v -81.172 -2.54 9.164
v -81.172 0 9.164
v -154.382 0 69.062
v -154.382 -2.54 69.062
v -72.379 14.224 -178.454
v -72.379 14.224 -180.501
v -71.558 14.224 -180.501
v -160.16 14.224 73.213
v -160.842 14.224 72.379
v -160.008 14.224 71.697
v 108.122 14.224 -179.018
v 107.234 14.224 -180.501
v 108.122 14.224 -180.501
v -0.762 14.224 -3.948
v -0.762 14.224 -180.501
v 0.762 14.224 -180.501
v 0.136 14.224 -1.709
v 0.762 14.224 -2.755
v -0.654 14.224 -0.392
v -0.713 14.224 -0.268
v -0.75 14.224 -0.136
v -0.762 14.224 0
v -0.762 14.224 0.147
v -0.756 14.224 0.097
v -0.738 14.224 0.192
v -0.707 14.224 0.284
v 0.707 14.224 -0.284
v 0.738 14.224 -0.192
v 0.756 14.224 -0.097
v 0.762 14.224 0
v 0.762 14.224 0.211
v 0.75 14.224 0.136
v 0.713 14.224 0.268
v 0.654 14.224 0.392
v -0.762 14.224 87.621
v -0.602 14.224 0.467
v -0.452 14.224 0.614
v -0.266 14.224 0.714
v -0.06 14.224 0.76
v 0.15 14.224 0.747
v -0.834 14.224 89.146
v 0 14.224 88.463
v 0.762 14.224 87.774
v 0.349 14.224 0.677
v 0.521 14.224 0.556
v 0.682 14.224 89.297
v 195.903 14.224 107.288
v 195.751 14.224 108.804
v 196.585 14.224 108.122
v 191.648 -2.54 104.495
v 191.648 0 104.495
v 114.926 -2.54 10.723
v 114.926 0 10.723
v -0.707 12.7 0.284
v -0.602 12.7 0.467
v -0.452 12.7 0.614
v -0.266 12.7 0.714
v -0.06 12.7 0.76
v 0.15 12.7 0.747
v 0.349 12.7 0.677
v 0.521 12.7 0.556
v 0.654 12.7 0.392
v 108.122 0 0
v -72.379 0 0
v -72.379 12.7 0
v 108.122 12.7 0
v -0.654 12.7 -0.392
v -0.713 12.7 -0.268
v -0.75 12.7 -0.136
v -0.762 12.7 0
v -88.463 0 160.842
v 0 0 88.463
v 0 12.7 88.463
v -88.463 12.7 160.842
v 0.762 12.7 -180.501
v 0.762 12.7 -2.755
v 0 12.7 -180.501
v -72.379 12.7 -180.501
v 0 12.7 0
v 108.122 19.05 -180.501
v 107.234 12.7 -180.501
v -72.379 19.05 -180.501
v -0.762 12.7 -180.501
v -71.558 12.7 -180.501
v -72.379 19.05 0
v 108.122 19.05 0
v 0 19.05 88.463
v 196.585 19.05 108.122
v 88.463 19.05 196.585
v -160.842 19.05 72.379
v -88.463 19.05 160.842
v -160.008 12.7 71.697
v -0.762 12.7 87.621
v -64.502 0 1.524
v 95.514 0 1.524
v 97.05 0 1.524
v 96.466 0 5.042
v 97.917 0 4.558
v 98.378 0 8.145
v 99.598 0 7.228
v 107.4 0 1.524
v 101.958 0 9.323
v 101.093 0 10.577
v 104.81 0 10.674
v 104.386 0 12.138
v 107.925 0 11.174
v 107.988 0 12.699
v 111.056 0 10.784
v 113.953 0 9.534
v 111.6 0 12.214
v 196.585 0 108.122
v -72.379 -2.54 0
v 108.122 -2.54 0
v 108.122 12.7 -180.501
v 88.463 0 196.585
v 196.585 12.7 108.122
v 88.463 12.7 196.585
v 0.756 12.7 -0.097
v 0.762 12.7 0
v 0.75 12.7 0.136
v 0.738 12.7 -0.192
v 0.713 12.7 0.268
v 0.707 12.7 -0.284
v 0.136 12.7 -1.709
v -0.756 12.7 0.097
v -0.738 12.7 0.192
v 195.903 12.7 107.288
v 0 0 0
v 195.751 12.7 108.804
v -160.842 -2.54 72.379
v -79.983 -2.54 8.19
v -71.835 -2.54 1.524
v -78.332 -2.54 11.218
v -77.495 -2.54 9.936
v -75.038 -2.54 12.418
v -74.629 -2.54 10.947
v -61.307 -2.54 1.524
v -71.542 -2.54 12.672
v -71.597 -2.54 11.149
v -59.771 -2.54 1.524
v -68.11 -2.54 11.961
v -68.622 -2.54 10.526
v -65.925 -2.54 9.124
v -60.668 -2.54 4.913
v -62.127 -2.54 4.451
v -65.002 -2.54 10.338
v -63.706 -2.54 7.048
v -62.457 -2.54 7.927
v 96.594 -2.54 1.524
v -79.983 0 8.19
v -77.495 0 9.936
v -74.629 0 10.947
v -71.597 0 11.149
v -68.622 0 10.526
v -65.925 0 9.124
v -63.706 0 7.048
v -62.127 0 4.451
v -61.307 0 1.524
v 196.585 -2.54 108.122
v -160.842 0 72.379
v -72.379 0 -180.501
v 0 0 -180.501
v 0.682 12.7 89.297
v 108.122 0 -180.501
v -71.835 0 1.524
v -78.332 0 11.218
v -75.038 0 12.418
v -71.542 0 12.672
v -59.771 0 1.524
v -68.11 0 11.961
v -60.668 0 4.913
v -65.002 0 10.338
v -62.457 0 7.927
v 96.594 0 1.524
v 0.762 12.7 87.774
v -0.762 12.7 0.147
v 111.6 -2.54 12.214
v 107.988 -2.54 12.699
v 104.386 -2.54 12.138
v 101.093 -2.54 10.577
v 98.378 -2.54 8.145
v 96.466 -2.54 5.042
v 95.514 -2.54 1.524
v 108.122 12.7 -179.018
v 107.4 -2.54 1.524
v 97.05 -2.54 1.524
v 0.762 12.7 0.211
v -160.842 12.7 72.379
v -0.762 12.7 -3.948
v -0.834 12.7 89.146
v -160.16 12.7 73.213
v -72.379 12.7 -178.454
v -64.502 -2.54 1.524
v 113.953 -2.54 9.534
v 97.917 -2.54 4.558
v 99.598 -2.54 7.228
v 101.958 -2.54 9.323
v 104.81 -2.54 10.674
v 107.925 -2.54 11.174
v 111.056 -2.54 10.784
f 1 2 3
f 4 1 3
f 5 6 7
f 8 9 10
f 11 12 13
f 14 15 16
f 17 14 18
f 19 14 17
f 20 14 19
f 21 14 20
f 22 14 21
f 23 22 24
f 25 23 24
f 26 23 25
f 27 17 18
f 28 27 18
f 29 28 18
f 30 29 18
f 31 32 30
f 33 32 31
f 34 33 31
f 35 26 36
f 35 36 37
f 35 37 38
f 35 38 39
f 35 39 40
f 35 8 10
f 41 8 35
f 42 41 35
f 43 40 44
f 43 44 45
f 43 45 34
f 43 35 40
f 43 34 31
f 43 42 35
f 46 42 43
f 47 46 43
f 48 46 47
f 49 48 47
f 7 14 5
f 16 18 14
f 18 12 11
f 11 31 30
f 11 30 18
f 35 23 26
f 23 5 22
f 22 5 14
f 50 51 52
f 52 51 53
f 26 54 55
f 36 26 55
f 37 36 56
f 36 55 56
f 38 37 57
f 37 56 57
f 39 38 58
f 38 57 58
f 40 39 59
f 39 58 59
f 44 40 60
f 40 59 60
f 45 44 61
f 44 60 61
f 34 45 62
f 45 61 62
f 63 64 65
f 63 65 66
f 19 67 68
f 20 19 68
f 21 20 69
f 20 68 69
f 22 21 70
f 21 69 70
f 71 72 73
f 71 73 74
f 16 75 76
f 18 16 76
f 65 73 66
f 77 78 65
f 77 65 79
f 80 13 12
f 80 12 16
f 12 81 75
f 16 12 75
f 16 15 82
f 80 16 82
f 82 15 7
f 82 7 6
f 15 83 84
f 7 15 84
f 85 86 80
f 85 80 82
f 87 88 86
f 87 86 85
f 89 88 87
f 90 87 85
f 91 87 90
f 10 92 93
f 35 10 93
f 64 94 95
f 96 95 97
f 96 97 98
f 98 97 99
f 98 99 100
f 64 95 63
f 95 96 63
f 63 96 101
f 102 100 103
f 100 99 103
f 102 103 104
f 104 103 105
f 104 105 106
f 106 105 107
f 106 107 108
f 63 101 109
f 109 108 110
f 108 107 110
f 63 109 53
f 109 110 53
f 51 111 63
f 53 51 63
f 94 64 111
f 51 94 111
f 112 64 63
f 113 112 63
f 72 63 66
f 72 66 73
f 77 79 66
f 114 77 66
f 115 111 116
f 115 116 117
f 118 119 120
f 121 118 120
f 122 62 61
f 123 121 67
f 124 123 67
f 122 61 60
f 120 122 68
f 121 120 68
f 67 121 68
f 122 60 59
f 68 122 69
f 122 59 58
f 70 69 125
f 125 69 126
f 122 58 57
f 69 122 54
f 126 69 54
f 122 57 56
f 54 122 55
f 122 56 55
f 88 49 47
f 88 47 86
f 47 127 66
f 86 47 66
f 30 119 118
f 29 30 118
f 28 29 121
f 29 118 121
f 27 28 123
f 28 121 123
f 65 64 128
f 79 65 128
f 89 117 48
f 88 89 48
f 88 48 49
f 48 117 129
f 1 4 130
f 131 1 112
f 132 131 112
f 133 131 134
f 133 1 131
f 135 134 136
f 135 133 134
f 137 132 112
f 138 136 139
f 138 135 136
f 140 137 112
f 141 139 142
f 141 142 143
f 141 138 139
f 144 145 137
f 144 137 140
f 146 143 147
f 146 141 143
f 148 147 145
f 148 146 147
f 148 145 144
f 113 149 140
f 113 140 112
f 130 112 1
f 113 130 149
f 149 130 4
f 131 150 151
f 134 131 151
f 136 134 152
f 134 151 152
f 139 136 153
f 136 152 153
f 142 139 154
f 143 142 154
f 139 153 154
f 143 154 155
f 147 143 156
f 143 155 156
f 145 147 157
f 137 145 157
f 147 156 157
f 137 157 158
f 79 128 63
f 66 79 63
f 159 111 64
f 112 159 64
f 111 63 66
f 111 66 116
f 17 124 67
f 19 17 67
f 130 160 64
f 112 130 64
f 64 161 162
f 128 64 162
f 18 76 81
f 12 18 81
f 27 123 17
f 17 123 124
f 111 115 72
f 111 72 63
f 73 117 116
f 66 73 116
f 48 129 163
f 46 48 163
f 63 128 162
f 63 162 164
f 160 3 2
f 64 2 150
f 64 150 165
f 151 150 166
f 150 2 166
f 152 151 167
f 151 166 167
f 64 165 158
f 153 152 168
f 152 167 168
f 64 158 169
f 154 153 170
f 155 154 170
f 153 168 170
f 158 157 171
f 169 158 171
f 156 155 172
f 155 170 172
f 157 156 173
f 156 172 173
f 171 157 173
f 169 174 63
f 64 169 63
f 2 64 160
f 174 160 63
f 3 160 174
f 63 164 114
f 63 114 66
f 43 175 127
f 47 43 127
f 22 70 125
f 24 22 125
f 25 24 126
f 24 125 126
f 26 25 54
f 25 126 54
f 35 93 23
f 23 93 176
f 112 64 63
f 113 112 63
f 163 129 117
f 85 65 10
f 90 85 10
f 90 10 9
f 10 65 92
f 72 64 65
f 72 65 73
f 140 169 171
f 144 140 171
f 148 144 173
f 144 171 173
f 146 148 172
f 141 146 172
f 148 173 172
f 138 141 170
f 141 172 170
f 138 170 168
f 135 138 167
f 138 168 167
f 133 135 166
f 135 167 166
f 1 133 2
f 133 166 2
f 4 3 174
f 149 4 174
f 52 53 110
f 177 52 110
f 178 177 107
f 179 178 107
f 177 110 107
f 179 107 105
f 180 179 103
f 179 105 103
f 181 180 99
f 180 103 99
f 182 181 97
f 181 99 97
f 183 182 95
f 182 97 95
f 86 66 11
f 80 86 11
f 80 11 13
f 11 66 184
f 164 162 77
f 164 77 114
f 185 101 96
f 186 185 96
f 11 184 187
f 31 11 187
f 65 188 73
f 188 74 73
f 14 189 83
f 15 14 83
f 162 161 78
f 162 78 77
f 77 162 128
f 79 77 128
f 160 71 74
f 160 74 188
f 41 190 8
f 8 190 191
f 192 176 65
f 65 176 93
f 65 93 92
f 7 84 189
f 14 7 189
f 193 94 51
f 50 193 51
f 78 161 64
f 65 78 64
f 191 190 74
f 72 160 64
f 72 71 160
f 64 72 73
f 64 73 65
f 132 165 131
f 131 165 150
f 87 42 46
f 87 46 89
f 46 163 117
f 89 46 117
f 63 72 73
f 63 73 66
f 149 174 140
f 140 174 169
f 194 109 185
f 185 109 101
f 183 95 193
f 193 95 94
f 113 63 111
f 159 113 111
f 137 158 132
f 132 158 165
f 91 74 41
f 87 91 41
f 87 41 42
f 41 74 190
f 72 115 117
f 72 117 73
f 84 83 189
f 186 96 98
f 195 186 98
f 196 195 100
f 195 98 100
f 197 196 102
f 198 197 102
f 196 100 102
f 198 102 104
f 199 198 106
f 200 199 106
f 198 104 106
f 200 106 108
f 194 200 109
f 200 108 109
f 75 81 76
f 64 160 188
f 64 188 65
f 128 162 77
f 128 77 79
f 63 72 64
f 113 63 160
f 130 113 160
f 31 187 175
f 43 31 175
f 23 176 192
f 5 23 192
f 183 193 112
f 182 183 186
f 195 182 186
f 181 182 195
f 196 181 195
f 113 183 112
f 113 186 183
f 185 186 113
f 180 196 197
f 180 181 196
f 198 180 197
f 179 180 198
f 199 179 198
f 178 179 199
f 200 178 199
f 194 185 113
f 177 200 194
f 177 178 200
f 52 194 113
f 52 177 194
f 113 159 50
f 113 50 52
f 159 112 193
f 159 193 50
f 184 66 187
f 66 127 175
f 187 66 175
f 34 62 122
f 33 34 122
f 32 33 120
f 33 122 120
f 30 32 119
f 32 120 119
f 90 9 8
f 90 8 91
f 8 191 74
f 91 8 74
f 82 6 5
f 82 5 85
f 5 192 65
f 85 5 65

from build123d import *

# Parameters (mm, degrees)
F1_DEPTH  = 12.7
F3_DEPTH  = 6.35
F4_DEPTH  = 12.7
F0_W      = 72.3790794264
F0_H      = 180.5009141251
F5_DEPTH  = 12.7
F6_DEPTH  = 12.7
F0_W_2    = 108.1218346987
F7_DEPTH  = 12.7
F9_DEPTH  = 2.54
F11_DEPTH = 2.54
F13_DEPTH = 1.524


with BuildPart() as f1:
    # F0 (on Front) → F1 (new body)
    with BuildSketch(Plane.XZ):
        Polygon((0, 88.4633192989), (-72.3790794264, 0), (0, 0), (108.1218346987, 0), align=None)
    extrude(amount=-F1_DEPTH)


with BuildPart() as f3:
    # F2 (on face) → F3 (new body)
    with BuildSketch(Plane(origin=(0, 12.7, 0), x_dir=(-1, 0, 0), z_dir=(0, 1, 0))):
        Polygon((-196.5851539976, 108.1218346987), (-108.1218346987, 0), (-108.1218346987, -180.5009141251), (72.3790794264, -180.5009141251), (72.3790794264, 0), (160.8423987253, 72.3790794264), (88.4633192989, 160.8423987253), (0, 88.4633192989), (-88.4633192989, 196.5851539976), align=None)
    extrude(amount=F3_DEPTH)

    # F12 (on face) → F13 (cut)
    with BuildSketch(Plane.XZ.offset(-12.7)):
        with BuildLine():
            Line((196.5093321637, 108.8800530376), (-0.0758218339, 89.2215376379))
            ThreePointArc((-0.0758218339, 89.2215376379), (0.5113060544, 89.0283061295), (0.762, 88.4633192989))
            Line((0.762, 88.4633192989), (0.762, 87.7737187766))
            Line((0.762, 87.7737187766), (196.6609758315, 107.3636163598))
            ThreePointArc((196.6609758315, 107.3636163598), (197.3433723366, 108.1976565326), (196.5093321637, 108.8800530376))
        make_face()
        with BuildLine():
            ThreePointArc((-0.762, 88.4633192989), (-0.5649868306, 88.9746253534), (-0.0758218339, 89.2215376379))
            Line((-0.0758218339, 89.2215376379), (-160.9182205592, 73.1372977653))
            ThreePointArc((-160.9182205592, 73.1372977653), (-161.6006170643, 72.3032575925), (-160.7665768915, 71.6208610875))
            Line((-160.7665768915, 71.6208610875), (-0.762, 87.6213187766))
            Line((-0.762, 87.6213187766), (-0.762, 88.4633192989))
        make_face()
        with BuildLine():
            ThreePointArc((0.762, 88.4633192989), (0.5113060544, 89.0283061295), (-0.0758218339, 89.2215376379))
            ThreePointArc((-0.0758218339, 89.2215376379), (-0.5649868306, 88.9746253534), (-0.762, 88.4633192989))
            ThreePointArc((-0.762, 88.4633192989), (-0.5113060544, 87.8983324684), (0.0758218339, 87.70510096))
            ThreePointArc((0.0758218339, 87.70510096), (0.5649868306, 87.9520132445), (0.762, 88.4633192989))
        make_face()
        with BuildLine():
            Line((0.762, 87.7737187766), (0.762, 88.4633192989))
            ThreePointArc((0.762, 88.4633192989), (0.5649868306, 87.9520132445), (0.0758218339, 87.70510096))
            Line((0.0758218339, 87.70510096), (0.762, 87.7737187766))
        make_face()
        with BuildLine():
            ThreePointArc((0.0758218339, 87.70510096), (-0.5113060544, 87.8983324684), (-0.762, 88.4633192989))
            Line((-0.762, 88.4633192989), (-0.762, 87.6213187766))
            Line((-0.762, 87.6213187766), (0.0758218339, 87.70510096))
        make_face()
        with BuildLine():
            Line((0.762, 87.7737187766), (0.0758218339, 87.70510096))
            Line((0.0758218339, 87.70510096), (-0.762, 87.6213187766))
            Line((-0.762, 87.6213187766), (-0.762, 0.1470849612))
            Line((-0.762, 0.1470849612), (-0.7072575137, 0.2836032604))
            ThreePointArc((-0.7072575137, 0.2836032604), (-0.060261329, 0.7596134361), (0.6536949755, 0.3915697626))
            Line((0.6536949755, 0.3915697626), (0.762, 0.2107630275))
            Line((0.762, 0.2107630275), (0.762, 87.7737187766))
        make_face()
        with BuildLine():
            Line((108.7755296742, -180.1093443625), (0.762, 0.2107630275))
            Line((0.762, 0.2107630275), (0.762, 1.47e-08))
            Line((0.762, 1.47e-08), (0.762, -2.7549613746))
            Line((0.762, -2.7549613746), (107.4681397232, -180.8924838877))
            ThreePointArc((107.4681397232, -180.8924838877), (108.5134044613, -181.1546091006), (108.7755296742, -180.1093443625))
        make_face()
        with BuildLine():
            Line((0.762, 1.47e-08), (0.762, 0.2107630275))
            Line((0.762, 0.2107630275), (0.6536949755, 0.3915697626))
            ThreePointArc((0.6536949755, 0.3915697626), (0.7344247972, 0.2031359574), (0.762, 1.47e-08))
        make_face()
        with BuildLine():
            Line((-0.7072575137, 0.2836032604), (-0.762, 0.1470849612))
            Line((-0.762, 0.1470849612), (-0.762, 7.8e-09))
            ThreePointArc((-0.762, 7.8e-09), (-0.7481892218, 0.1444191413), (-0.7072575137, 0.2836032604))
        make_face()
        with BuildLine():
            Line((-0.762, 7.8e-09), (-0.762, 0.1470849612))
            Line((-0.762, 0.1470849612), (-73.0863369401, -180.2173108647))
            ThreePointArc((-73.0863369401, -180.2173108647), (-72.6626826868, -181.2081716388), (-71.6718219127, -180.7845173855))
            Line((-71.6718219127, -180.7845173855), (-0.762, -3.9476775538))
            Line((-0.762, -3.9476775538), (-0.762, 7.8e-09))
        make_face()
        with BuildLine():
            Line((0.762, -2.7549613746), (0.762, 1.47e-08))
            ThreePointArc((0.762, 1.47e-08), (0.7481892239, -0.1444191303), (0.7072575137, -0.2836032604))
            Line((0.7072575137, -0.2836032604), (0.1355958061, -1.7092287534))
            Line((0.1355958061, -1.7092287534), (0.762, -2.7549613746))
        make_face()
        with BuildLine():
            ThreePointArc((-0.6536949755, -0.3915697626), (-0.7344248002, -0.2031359466), (-0.762, 7.8e-09))
            Line((-0.762, 7.8e-09), (-0.762, -3.9476775538))
            Line((-0.762, -3.9476775538), (0.1355958061, -1.7092287534))
            Line((0.1355958061, -1.7092287534), (-0.6536949755, -0.3915697626))
        make_face()
        with BuildLine():
            Line((0.762, -180.5009141251), (0.762, -2.7549613746))
            Line((0.762, -2.7549613746), (0.1355958061, -1.7092287534))
            Line((0.1355958061, -1.7092287534), (-0.762, -3.9476775538))
            Line((-0.762, -3.9476775538), (-0.762, -180.5009141251))
            ThreePointArc((-0.762, -180.5009141251), (0, -181.2629141251), (0.762, -180.5009141251))
        make_face()
    extrude(amount=-F13_DEPTH, mode=Mode.SUBTRACT)


with BuildPart() as f4:
    # F0 (on Front) → F4 (new body)
    with BuildSketch(Plane.XZ):
        Polygon((-160.8423987253, 72.3790794264), (-72.3790794264, 0), (0, 88.4633192989), (-88.4633192989, 160.8423987253), align=None)
    extrude(amount=-F4_DEPTH)


with BuildPart() as f5:
    # F0 (on Front) → F5 (new body)
    with BuildSketch(Plane.XZ):
        with Locations((-36.1895397132, -90.2504570626)):
            Rectangle(F0_W, F0_H)
    extrude(amount=-F5_DEPTH)


with BuildPart() as f6:
    # F0 (on Front) → F6 (new body)
    with BuildSketch(Plane.XZ):
        Polygon((88.4633192989, 196.5851539976), (0, 88.4633192989), (108.1218346987, 0), (196.5851539976, 108.1218346987), align=None)
    extrude(amount=-F6_DEPTH)


with BuildPart() as f7:
    # F0 (on Front) → F7 (new body)
    with BuildSketch(Plane.XZ):
        with Locations((54.0609173494, -90.2504570626)):
            Rectangle(F0_W_2, F0_H)
    extrude(amount=-F7_DEPTH)


with BuildPart() as f9:
    # F8 (on Front) → F9 (new body)
    with BuildSketch(Plane.XZ):
        Polygon((-160.8423987253, 72.3790794264), (-72.3790794264, 0), (108.1218346987, 0), align=None)
        with BuildLine():
            Line((-61.3074761098, 1.524), (-71.8350672381, 1.524))
            Line((-71.8350672381, 1.524), (-79.9829732348, 8.1904685428))
            ThreePointArc((-79.9829732348, 8.1904685428), (-68.6218593082, 10.5255058303), (-61.3074761098, 1.524))
        make_face(mode=Mode.SUBTRACT)
        with BuildLine():
            Line((-154.3819095996, 69.0623255685), (96.593843439, 1.524))
            Line((96.593843439, 1.524), (-59.7708510021, 1.524))
            ThreePointArc((-59.7708510021, 1.524), (-68.1095111103, 11.9608020799), (-81.1722554531, 9.1635176305))
            Line((-81.1722554531, 9.1635176305), (-154.3819095996, 69.0623255685))
        make_face(mode=Mode.SUBTRACT)
    extrude(amount=F9_DEPTH)


with BuildPart() as f11:
    # F10 (on face) → F11 (new body)
    with BuildSketch(Plane.XZ):
        Polygon((-72.3790794264, 0), (108.1218346987, 0), (196.5851539976, 108.1218346987), align=None)
        with BuildLine():
            Line((113.9532813935, 9.5340025931), (107.3996429082, 1.524))
            Line((107.3996429082, 1.524), (97.0502313821, 1.524))
            ThreePointArc((97.0502313821, 1.524), (103.3359339746, 10.099412372), (113.9532813935, 9.5340025931))
        make_face(mode=Mode.SUBTRACT)
        with BuildLine():
            Line((95.5136062744, 1.524), (-64.5020116843, 1.524))
            Line((-64.5020116843, 1.524), (191.6484736244, 104.4947930975))
            Line((191.6484736244, 104.4947930975), (114.9263304812, 10.7232848114))
            ThreePointArc((114.9263304812, 10.7232848114), (102.6833111486, 11.4766049682), (95.5136062744, 1.524))
        make_face(mode=Mode.SUBTRACT)
    extrude(amount=F11_DEPTH)


solid = Compound([f1.part, f3.part, f4.part, f5.part, f6.part, f7.part, f9.part, f11.part])
